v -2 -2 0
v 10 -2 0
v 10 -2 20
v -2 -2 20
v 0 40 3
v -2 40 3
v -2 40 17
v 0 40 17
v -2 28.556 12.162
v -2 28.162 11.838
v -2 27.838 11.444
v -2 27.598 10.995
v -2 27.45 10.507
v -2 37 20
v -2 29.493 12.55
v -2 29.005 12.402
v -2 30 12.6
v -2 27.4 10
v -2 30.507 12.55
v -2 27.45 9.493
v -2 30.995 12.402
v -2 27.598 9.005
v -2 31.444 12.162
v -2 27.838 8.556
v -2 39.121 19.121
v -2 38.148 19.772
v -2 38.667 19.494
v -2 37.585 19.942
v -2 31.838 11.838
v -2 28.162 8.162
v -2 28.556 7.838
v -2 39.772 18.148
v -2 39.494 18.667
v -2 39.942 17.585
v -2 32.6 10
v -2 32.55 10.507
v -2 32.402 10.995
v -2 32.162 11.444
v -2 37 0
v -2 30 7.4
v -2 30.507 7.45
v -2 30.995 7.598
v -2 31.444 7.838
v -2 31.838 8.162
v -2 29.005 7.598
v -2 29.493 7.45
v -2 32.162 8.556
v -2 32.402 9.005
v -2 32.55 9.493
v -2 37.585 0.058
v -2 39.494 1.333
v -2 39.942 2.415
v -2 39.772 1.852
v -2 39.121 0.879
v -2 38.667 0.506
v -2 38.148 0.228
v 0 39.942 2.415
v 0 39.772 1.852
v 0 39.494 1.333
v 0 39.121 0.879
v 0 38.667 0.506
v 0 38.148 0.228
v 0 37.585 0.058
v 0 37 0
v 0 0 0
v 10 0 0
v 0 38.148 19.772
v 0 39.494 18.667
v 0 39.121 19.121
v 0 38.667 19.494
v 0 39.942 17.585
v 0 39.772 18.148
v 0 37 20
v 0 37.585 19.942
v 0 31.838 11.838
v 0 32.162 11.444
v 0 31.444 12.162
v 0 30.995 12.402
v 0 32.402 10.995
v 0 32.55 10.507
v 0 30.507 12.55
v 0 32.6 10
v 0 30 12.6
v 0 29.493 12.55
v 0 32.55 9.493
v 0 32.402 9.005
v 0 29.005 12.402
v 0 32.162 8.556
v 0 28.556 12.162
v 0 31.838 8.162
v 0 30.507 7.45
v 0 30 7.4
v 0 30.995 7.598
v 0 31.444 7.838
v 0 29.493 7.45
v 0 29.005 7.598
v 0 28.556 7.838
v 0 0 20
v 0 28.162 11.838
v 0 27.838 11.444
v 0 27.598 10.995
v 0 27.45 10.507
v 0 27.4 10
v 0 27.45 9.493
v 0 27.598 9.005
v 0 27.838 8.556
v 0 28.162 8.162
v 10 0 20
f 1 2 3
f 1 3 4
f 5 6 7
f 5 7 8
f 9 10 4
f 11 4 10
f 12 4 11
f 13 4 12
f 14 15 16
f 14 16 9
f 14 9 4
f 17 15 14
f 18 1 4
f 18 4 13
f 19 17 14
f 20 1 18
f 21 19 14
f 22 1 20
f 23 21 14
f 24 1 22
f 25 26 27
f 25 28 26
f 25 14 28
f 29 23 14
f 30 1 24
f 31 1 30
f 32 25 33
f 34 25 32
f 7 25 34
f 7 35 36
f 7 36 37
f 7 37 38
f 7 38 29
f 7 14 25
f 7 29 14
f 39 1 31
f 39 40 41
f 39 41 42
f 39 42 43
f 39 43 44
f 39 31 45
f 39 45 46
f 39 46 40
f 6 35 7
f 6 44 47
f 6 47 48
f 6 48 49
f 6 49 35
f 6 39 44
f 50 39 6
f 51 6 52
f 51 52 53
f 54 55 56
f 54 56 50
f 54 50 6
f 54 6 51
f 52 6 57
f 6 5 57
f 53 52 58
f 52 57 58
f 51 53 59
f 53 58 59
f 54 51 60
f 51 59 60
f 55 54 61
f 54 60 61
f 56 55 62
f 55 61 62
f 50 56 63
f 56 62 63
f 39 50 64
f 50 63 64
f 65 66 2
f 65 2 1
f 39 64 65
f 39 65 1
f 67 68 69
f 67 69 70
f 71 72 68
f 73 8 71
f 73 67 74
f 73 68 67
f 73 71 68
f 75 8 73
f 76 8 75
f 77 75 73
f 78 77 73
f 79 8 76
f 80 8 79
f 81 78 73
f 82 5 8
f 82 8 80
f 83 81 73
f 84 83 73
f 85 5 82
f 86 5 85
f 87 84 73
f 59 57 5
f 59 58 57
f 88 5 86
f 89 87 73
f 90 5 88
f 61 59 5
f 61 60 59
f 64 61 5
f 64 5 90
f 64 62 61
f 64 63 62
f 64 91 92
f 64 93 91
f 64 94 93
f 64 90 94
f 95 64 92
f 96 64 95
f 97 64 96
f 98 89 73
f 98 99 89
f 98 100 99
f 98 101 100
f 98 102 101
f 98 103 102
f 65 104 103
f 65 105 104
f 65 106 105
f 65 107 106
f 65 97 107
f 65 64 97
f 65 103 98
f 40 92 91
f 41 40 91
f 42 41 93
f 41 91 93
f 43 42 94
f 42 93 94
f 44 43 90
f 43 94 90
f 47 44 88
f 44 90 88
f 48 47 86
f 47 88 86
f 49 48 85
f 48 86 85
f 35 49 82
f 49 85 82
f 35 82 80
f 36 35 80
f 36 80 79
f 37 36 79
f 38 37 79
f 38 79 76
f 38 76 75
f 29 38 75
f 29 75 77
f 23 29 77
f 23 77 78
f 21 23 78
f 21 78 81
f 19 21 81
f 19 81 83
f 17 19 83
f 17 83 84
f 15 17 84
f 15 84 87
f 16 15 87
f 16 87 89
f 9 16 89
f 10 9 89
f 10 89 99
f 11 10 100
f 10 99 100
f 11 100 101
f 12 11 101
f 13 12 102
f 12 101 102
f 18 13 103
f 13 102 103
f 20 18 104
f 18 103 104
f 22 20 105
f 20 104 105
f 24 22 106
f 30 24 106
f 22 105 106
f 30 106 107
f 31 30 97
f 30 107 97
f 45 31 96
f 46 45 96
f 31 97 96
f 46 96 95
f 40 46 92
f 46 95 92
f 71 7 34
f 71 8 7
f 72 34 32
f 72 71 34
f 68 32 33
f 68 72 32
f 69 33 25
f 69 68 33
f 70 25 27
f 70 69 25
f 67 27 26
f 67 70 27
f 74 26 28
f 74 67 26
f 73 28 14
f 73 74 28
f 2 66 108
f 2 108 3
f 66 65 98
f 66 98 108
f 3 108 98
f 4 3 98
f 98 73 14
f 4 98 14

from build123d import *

# Parameters (mm, degrees)
EXTRUDE_1_DEPTH     = 20
SKETCH_2_R          = 2.6
CUT_EXTRUDE_1_DEPTH = 10
FILLET_1_R          = 3


with BuildPart() as part:
    # 草图1 → 拉伸-薄壁1 (new body)
    with BuildSketch(Plane.XY):
        Polygon((0, 40), (0, 0), (10, 0), (10, -2), (-2, -2), (-2, 40), align=None)
    extrude(amount=EXTRUDE_1_DEPTH)

    # 草图2 → 切除-拉伸1 (cut)
    with BuildSketch(Plane(origin=(0, 0, 0), x_dir=(0, 0, -1), z_dir=(1, 0, 0))):
        with Locations((-10, 30)):
            Circle(SKETCH_2_R)
    extrude(amount=-CUT_EXTRUDE_1_DEPTH, mode=Mode.SUBTRACT)

    # 圆角1
    fillet_1_edges = [part.edges().sort_by_distance(p)[0] for p in [
        (-1, 40, 20),
        (-1, 40, 0),
    ]]
    fillet(fillet_1_edges, radius=FILLET_1_R)


solid = part.part
